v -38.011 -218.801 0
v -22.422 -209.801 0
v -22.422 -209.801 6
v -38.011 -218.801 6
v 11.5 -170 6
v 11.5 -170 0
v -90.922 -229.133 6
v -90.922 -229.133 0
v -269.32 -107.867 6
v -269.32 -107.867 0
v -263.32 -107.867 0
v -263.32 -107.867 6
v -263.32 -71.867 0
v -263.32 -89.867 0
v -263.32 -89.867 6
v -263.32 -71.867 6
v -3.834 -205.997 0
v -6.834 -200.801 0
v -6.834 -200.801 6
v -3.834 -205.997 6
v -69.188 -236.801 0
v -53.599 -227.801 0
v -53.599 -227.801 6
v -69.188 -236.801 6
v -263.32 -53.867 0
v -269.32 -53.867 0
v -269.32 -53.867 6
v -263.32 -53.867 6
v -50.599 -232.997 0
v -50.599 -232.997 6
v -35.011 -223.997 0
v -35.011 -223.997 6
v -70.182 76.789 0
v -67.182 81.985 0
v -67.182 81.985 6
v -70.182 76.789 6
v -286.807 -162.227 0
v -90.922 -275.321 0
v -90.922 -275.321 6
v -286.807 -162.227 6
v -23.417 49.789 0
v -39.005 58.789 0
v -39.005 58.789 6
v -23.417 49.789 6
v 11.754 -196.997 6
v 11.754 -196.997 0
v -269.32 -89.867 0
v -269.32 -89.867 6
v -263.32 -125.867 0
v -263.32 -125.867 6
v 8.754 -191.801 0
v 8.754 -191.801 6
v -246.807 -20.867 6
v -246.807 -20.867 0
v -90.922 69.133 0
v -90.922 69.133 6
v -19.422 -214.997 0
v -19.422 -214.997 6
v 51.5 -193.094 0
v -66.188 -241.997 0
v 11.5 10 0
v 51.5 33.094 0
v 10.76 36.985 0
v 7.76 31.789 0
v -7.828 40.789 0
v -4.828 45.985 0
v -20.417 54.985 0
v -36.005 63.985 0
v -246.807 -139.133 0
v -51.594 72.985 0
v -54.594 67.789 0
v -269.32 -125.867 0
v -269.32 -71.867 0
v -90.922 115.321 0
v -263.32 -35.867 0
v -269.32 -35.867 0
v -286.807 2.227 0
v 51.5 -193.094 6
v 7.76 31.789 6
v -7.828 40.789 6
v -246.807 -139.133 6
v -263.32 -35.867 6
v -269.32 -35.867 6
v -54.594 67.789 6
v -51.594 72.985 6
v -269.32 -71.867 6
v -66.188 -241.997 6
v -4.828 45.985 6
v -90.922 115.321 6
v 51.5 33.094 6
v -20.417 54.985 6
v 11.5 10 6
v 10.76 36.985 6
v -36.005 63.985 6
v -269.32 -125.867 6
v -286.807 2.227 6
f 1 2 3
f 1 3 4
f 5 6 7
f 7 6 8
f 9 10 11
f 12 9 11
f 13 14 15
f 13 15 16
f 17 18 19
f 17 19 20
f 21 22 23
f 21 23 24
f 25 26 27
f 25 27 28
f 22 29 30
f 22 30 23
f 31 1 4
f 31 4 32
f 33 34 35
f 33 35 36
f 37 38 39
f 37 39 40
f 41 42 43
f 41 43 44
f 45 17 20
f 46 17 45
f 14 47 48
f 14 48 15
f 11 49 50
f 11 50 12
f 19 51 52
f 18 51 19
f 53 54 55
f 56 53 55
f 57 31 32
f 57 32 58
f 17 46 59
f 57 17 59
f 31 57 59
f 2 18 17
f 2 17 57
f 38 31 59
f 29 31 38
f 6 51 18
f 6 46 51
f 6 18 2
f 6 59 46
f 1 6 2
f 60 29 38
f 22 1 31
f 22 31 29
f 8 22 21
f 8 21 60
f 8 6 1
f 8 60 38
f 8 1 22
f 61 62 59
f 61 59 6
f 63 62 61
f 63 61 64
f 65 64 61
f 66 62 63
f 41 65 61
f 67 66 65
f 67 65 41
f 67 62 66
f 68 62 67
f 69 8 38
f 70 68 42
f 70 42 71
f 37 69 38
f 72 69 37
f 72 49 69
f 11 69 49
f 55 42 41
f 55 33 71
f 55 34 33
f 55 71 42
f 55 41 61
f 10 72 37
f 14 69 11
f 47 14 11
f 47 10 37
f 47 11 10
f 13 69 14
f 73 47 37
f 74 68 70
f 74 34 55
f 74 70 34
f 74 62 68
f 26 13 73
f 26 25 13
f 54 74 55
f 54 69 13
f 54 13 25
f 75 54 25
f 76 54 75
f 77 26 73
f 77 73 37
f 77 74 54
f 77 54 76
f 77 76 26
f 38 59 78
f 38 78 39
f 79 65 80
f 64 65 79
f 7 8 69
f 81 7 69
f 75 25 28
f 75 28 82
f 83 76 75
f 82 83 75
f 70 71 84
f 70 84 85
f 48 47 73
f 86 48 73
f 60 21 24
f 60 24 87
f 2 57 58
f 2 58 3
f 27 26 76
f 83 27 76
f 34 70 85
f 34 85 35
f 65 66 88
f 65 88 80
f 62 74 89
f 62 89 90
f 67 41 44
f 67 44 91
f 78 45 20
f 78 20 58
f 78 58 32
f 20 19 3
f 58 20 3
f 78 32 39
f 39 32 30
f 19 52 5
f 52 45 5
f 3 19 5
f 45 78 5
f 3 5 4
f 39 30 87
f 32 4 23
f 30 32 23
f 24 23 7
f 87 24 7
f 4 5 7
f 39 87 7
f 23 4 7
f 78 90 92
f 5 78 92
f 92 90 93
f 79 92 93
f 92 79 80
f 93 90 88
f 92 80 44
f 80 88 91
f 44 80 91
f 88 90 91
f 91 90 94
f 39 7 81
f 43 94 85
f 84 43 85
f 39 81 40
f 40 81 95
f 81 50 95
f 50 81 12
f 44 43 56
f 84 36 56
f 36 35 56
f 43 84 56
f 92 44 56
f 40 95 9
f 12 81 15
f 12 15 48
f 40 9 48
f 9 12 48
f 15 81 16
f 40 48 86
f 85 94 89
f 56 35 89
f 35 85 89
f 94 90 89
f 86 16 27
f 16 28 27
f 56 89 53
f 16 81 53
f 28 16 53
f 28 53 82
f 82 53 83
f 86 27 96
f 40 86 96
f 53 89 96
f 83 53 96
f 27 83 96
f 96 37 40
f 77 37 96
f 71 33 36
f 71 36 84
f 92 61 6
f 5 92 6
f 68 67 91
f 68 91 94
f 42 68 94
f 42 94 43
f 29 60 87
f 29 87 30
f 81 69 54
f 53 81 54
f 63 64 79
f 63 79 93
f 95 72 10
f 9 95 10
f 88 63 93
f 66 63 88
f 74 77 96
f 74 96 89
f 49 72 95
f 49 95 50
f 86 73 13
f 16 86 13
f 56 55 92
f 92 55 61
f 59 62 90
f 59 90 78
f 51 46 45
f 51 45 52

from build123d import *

# Parameters (mm, degrees)
BOSS_EXTRU_1_DEPTH   = 6
EMPREINTE1_OUTLINE_W = 6
EMPREINTE1_OUTLINE_H = 18
EMPREINTE1_DEPTH     = 6


# Read off the part's stored shape, not the designer's step: Empreinte1
with BuildPart() as part:
    # Esquisse1 → Boss.-Extru.1 (new body)
    with BuildSketch(Plane.XY):
        Polygon((-286.806510123, 2.22734392), (-90.921937441, 115.321354688), (51.5, 33.094010768), (51.5, -193.094010768), (-90.921937441, -275.321354688), (-286.806510123, -162.22734392), align=None)
        Polygon((-246.806510123, -139.133333153), (-246.806510123, -20.866666847), (-90.921937441, 69.133333153), (11.5, 10), (11.5, -170), (-90.921937441, -229.133333153), align=None, mode=Mode.SUBTRACT)
    extrude(amount=BOSS_EXTRU_1_DEPTH)

    # Empreinte1 outline → Empreinte1 (cut)
    with BuildSketch(Plane.XY):
        Polygon((-6.833974392, -200.800909817), (-3.833974392, -205.99706224), (11.754482876, -196.99706224), (8.754482876, -191.800909817), align=None)
        Polygon((-22.42243166, -209.800909817), (-38.010888928, -218.800909817), (-35.010888928, -223.99706224), (-19.42243166, -214.99706224), align=None)
        Polygon((-53.599346196, -227.800909817), (-69.187803464, -236.800909817), (-66.187803464, -241.99706224), (-50.599346196, -232.99706224), align=None)
        with Locations((-266.319584862, -116.867002045)):
            Rectangle(EMPREINTE1_OUTLINE_W, EMPREINTE1_OUTLINE_H)
        with Locations((-266.319584862, -80.867002045)):
            Rectangle(EMPREINTE1_OUTLINE_W, EMPREINTE1_OUTLINE_H)
        with Locations((-266.319584862, -44.867002045)):
            Rectangle(EMPREINTE1_OUTLINE_W, EMPREINTE1_OUTLINE_H)
        Polygon((-54.593654623, 67.789098441), (-51.593654623, 72.985250863), (-67.182111891, 81.985250863), (-70.182111891, 76.789098441), align=None)
        Polygon((-39.005197355, 58.789098441), (-23.416740087, 49.789098441), (-20.416740087, 54.985250863), (-36.005197355, 63.985250863), align=None)
        Polygon((-7.828282819, 40.789098441), (7.76017445, 31.789098441), (10.76017445, 36.985250863), (-4.828282819, 45.985250863), align=None)
    extrude(amount=EMPREINTE1_DEPTH, mode=Mode.SUBTRACT)


solid = part.part
